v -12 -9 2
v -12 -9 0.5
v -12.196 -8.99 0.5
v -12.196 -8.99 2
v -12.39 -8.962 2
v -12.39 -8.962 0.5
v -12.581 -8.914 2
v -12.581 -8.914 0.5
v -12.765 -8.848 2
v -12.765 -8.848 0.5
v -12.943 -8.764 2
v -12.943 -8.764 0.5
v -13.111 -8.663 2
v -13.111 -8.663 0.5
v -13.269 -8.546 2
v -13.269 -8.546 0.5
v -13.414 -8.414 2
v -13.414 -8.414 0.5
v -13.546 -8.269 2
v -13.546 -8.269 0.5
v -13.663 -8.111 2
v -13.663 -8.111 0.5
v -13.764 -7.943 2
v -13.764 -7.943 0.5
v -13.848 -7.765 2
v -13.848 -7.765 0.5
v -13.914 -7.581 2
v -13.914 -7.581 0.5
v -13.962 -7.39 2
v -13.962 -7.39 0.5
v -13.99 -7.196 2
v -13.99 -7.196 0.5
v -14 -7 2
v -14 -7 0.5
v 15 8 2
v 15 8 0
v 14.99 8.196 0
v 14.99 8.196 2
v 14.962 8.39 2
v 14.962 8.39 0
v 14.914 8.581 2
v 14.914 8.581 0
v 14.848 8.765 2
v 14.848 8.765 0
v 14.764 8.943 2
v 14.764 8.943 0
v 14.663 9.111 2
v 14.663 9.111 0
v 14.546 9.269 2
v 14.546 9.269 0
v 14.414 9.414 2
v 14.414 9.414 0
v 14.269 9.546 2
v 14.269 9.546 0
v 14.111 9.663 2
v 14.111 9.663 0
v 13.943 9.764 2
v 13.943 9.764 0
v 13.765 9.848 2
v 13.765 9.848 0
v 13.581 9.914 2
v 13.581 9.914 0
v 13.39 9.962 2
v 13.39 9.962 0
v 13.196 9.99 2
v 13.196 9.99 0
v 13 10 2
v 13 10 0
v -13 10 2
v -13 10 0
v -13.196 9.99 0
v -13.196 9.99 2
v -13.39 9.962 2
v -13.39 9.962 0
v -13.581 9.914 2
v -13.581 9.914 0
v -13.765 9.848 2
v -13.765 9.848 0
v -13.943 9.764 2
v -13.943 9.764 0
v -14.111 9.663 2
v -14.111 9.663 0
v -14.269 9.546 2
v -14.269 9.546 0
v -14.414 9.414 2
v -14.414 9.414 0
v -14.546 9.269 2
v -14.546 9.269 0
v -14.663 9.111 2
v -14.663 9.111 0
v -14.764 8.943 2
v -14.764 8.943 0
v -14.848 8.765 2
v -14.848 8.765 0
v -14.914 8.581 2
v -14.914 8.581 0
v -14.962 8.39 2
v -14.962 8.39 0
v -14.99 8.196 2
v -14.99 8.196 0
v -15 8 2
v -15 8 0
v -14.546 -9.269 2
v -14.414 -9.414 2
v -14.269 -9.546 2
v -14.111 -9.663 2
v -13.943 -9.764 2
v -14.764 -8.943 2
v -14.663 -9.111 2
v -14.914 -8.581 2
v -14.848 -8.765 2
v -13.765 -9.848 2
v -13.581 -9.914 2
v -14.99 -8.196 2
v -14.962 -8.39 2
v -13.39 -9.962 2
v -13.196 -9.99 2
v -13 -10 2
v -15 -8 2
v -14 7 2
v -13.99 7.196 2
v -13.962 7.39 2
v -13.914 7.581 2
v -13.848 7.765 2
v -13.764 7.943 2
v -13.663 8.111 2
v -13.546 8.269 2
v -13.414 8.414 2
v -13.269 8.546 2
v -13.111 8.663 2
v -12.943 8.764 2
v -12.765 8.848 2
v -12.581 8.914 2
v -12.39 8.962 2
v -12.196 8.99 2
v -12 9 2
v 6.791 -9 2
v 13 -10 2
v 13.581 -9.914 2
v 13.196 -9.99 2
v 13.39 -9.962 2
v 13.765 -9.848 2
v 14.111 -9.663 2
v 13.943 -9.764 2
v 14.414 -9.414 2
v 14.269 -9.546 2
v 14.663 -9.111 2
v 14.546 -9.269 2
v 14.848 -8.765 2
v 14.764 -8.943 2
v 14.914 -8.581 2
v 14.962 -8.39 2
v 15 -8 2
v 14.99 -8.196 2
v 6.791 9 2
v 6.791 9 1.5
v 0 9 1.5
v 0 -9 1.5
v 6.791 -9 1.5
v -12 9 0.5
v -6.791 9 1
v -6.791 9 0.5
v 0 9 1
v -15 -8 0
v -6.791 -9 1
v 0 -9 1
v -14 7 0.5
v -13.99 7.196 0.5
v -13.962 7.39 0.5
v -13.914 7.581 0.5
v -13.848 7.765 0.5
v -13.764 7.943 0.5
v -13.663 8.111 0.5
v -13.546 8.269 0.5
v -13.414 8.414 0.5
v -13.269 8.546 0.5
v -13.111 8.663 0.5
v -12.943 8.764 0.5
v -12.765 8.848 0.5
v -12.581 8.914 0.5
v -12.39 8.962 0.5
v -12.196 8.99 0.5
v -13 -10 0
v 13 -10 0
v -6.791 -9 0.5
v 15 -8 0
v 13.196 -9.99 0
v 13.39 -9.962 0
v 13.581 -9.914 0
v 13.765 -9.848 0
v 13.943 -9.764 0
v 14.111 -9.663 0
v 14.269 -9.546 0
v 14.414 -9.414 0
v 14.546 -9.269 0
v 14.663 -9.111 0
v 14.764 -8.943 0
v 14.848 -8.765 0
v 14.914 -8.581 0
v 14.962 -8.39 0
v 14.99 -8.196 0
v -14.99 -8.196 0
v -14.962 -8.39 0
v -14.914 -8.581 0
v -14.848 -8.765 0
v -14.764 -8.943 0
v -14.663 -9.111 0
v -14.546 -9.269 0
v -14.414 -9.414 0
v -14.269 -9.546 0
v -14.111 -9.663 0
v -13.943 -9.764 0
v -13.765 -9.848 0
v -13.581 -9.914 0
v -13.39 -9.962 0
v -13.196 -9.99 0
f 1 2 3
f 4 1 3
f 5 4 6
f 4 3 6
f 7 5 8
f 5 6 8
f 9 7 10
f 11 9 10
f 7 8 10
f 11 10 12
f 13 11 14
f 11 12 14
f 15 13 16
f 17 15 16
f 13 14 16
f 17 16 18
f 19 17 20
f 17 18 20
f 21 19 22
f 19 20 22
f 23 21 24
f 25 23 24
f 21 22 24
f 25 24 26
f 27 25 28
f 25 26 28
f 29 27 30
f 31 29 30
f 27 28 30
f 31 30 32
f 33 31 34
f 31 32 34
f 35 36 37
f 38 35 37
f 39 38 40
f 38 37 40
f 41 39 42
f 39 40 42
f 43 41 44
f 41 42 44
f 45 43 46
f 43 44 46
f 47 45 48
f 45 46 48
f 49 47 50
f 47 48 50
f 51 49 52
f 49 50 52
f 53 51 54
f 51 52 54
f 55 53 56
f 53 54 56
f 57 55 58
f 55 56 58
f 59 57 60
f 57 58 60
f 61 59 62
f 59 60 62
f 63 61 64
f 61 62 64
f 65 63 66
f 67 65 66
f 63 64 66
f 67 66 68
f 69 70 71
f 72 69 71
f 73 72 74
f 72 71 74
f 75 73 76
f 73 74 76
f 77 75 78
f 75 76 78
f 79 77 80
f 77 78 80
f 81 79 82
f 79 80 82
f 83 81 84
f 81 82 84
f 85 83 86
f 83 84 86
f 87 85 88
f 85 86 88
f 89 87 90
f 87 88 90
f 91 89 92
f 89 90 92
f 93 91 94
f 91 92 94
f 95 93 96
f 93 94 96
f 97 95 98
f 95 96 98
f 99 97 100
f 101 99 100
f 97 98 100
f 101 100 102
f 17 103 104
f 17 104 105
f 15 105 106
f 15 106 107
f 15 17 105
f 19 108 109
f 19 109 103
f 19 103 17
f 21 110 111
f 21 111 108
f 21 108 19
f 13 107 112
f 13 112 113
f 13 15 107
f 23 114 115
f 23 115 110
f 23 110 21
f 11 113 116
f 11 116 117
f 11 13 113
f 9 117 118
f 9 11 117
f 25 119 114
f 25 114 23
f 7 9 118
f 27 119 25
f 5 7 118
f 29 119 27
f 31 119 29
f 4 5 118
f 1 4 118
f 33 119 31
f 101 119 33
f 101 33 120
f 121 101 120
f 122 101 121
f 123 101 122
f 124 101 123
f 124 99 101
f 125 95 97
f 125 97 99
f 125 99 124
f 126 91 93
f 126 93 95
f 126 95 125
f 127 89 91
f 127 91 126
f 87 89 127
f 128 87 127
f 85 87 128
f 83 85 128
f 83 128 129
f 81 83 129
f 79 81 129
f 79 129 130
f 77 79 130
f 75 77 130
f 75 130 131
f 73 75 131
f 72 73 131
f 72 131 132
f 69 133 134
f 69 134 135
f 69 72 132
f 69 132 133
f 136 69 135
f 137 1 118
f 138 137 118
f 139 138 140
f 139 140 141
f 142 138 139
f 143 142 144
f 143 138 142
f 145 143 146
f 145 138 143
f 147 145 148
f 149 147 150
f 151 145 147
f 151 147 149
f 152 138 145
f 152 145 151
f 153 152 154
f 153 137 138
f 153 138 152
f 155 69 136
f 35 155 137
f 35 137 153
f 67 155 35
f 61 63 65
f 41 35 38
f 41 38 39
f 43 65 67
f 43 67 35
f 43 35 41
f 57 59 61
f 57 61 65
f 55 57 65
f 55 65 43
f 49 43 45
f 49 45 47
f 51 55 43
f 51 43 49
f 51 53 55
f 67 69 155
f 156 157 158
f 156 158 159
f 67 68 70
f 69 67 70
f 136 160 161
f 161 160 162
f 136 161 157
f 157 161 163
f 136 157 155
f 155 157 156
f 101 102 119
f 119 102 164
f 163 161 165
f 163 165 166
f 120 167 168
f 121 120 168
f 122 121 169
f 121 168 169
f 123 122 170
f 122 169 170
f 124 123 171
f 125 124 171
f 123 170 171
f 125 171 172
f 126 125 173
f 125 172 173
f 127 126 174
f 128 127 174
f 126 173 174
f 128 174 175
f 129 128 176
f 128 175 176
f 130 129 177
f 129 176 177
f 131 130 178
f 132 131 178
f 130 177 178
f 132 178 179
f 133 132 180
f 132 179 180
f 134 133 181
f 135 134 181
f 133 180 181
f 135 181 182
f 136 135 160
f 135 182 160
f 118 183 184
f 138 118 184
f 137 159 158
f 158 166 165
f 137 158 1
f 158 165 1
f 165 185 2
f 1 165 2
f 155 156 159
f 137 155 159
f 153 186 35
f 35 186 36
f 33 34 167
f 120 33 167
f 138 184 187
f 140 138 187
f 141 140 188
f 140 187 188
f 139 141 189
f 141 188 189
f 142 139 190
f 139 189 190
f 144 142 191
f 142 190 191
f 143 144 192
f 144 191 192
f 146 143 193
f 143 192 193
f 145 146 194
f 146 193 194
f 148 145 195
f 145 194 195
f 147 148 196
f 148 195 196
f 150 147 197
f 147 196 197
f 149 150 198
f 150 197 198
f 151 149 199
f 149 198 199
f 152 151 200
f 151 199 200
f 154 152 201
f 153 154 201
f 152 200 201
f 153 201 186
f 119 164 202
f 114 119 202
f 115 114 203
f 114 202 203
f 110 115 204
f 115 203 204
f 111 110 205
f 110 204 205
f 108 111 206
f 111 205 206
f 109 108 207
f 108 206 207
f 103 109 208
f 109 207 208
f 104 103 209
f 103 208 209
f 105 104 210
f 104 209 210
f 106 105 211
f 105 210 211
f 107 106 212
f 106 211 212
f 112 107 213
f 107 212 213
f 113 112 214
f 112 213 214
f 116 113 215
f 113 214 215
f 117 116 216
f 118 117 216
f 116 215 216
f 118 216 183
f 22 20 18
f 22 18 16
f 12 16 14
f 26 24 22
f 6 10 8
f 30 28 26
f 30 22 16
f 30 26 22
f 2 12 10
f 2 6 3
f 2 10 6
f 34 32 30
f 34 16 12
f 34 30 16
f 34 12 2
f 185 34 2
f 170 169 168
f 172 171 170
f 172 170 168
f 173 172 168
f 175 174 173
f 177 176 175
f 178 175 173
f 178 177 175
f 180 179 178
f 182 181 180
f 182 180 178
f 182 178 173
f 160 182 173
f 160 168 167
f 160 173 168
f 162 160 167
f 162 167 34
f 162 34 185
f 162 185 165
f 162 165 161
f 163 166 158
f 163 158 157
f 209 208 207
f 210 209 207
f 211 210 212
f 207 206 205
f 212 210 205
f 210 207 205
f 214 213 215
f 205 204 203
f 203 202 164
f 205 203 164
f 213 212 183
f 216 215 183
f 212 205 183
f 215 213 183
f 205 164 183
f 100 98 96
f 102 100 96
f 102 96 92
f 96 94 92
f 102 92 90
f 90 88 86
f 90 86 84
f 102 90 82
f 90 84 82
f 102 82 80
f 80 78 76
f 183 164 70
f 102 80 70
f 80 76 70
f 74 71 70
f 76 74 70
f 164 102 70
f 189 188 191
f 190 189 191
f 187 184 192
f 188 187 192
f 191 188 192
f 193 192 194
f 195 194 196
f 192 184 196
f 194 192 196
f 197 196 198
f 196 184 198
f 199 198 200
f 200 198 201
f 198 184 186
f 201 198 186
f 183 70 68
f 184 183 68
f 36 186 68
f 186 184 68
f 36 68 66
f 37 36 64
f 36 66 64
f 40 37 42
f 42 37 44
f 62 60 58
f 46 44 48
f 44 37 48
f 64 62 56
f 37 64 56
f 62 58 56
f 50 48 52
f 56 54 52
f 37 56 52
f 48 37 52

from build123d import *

# Parameters (mm, degrees)
F1_DEPTH = 2
F2_DEPTH = 0.5
F0_W     = 6.791314
F0_H     = 18
F3_DEPTH = 1.5
F4_DEPTH = 1
F5_DEPTH = 2


with BuildPart() as f1:
    # F0 (on Top) → F1 (new body)
    with BuildSketch(Plane.XY):
        with BuildLine():
            ThreePointArc((-15, -8), (-14.414214, -9.414214), (-13, -10))
            Line((-13, -10), (13, -10))
            ThreePointArc((13, -10), (14.414214, -9.414214), (15, -8))
            Line((15, -8), (15, 8))
            ThreePointArc((15, 8), (14.414214, 9.414214), (13, 10))
            Line((13, 10), (-13, 10))
            ThreePointArc((-13, 10), (-14.414214, 9.414214), (-15, 8))
            Line((-15, 8), (-15, -8))
        make_face()
        with BuildLine():
            ThreePointArc((-14, 7), (-13.414214, 8.414214), (-12, 9))
            Line((-12, 9), (-6.791314, 9))
            Line((-6.791314, 9), (0, 9))
            Line((0, 9), (6.791314, 9))
            Line((6.791314, 9), (12, 9))
            ThreePointArc((12, 9), (13.414214, 8.414214), (14, 7))
            Line((14, 7), (14, -7))
            ThreePointArc((14, -7), (13.414214, -8.414214), (12, -9))
            Line((12, -9), (6.791314, -9))
            Line((6.791314, -9), (0, -9))
            Line((0, -9), (-6.791314, -9))
            Line((-6.791314, -9), (-12, -9))
            ThreePointArc((-12, -9), (-13.414214, -8.414214), (-14, -7))
            Line((-14, -7), (-14, 7))
        make_face(mode=Mode.SUBTRACT)
    extrude(amount=F1_DEPTH)

    # F0 (on Top) → F2 (join)
    with BuildSketch(Plane.XY):
        with BuildLine():
            Line((-6.791314, 9), (-12, 9))
            ThreePointArc((-12, 9), (-13.414214, 8.414214), (-14, 7))
            Line((-14, 7), (-14, -7))
            ThreePointArc((-14, -7), (-13.414214, -8.414214), (-12, -9))
            Line((-12, -9), (-6.791314, -9))
            Line((-6.791314, -9), (-6.791314, 9))
        make_face()
    extrude(amount=F2_DEPTH)

    # F0 (on Top) → F3 (join)
    with BuildSketch(Plane.XY):
        with Locations((3.395657, 0)):
            Rectangle(F0_W, F0_H)
    extrude(amount=F3_DEPTH)

    # F0 (on Top) → F4 (join)
    with BuildSketch(Plane.XY):
        with Locations((-3.395657, 0)):
            Rectangle(F0_W, F0_H)
    extrude(amount=F4_DEPTH)

    # F0 (on Top) → F5 (join)
    with BuildSketch(Plane.XY):
        with BuildLine():
            Line((12, 9), (6.791314, 9))
            Line((6.791314, 9), (6.791314, -9))
            Line((6.791314, -9), (12, -9))
            ThreePointArc((12, -9), (13.414214, -8.414214), (14, -7))
            Line((14, -7), (14, 7))
            ThreePointArc((14, 7), (13.414214, 8.414214), (12, 9))
        make_face()
    extrude(amount=F5_DEPTH)


solid = f1.part
